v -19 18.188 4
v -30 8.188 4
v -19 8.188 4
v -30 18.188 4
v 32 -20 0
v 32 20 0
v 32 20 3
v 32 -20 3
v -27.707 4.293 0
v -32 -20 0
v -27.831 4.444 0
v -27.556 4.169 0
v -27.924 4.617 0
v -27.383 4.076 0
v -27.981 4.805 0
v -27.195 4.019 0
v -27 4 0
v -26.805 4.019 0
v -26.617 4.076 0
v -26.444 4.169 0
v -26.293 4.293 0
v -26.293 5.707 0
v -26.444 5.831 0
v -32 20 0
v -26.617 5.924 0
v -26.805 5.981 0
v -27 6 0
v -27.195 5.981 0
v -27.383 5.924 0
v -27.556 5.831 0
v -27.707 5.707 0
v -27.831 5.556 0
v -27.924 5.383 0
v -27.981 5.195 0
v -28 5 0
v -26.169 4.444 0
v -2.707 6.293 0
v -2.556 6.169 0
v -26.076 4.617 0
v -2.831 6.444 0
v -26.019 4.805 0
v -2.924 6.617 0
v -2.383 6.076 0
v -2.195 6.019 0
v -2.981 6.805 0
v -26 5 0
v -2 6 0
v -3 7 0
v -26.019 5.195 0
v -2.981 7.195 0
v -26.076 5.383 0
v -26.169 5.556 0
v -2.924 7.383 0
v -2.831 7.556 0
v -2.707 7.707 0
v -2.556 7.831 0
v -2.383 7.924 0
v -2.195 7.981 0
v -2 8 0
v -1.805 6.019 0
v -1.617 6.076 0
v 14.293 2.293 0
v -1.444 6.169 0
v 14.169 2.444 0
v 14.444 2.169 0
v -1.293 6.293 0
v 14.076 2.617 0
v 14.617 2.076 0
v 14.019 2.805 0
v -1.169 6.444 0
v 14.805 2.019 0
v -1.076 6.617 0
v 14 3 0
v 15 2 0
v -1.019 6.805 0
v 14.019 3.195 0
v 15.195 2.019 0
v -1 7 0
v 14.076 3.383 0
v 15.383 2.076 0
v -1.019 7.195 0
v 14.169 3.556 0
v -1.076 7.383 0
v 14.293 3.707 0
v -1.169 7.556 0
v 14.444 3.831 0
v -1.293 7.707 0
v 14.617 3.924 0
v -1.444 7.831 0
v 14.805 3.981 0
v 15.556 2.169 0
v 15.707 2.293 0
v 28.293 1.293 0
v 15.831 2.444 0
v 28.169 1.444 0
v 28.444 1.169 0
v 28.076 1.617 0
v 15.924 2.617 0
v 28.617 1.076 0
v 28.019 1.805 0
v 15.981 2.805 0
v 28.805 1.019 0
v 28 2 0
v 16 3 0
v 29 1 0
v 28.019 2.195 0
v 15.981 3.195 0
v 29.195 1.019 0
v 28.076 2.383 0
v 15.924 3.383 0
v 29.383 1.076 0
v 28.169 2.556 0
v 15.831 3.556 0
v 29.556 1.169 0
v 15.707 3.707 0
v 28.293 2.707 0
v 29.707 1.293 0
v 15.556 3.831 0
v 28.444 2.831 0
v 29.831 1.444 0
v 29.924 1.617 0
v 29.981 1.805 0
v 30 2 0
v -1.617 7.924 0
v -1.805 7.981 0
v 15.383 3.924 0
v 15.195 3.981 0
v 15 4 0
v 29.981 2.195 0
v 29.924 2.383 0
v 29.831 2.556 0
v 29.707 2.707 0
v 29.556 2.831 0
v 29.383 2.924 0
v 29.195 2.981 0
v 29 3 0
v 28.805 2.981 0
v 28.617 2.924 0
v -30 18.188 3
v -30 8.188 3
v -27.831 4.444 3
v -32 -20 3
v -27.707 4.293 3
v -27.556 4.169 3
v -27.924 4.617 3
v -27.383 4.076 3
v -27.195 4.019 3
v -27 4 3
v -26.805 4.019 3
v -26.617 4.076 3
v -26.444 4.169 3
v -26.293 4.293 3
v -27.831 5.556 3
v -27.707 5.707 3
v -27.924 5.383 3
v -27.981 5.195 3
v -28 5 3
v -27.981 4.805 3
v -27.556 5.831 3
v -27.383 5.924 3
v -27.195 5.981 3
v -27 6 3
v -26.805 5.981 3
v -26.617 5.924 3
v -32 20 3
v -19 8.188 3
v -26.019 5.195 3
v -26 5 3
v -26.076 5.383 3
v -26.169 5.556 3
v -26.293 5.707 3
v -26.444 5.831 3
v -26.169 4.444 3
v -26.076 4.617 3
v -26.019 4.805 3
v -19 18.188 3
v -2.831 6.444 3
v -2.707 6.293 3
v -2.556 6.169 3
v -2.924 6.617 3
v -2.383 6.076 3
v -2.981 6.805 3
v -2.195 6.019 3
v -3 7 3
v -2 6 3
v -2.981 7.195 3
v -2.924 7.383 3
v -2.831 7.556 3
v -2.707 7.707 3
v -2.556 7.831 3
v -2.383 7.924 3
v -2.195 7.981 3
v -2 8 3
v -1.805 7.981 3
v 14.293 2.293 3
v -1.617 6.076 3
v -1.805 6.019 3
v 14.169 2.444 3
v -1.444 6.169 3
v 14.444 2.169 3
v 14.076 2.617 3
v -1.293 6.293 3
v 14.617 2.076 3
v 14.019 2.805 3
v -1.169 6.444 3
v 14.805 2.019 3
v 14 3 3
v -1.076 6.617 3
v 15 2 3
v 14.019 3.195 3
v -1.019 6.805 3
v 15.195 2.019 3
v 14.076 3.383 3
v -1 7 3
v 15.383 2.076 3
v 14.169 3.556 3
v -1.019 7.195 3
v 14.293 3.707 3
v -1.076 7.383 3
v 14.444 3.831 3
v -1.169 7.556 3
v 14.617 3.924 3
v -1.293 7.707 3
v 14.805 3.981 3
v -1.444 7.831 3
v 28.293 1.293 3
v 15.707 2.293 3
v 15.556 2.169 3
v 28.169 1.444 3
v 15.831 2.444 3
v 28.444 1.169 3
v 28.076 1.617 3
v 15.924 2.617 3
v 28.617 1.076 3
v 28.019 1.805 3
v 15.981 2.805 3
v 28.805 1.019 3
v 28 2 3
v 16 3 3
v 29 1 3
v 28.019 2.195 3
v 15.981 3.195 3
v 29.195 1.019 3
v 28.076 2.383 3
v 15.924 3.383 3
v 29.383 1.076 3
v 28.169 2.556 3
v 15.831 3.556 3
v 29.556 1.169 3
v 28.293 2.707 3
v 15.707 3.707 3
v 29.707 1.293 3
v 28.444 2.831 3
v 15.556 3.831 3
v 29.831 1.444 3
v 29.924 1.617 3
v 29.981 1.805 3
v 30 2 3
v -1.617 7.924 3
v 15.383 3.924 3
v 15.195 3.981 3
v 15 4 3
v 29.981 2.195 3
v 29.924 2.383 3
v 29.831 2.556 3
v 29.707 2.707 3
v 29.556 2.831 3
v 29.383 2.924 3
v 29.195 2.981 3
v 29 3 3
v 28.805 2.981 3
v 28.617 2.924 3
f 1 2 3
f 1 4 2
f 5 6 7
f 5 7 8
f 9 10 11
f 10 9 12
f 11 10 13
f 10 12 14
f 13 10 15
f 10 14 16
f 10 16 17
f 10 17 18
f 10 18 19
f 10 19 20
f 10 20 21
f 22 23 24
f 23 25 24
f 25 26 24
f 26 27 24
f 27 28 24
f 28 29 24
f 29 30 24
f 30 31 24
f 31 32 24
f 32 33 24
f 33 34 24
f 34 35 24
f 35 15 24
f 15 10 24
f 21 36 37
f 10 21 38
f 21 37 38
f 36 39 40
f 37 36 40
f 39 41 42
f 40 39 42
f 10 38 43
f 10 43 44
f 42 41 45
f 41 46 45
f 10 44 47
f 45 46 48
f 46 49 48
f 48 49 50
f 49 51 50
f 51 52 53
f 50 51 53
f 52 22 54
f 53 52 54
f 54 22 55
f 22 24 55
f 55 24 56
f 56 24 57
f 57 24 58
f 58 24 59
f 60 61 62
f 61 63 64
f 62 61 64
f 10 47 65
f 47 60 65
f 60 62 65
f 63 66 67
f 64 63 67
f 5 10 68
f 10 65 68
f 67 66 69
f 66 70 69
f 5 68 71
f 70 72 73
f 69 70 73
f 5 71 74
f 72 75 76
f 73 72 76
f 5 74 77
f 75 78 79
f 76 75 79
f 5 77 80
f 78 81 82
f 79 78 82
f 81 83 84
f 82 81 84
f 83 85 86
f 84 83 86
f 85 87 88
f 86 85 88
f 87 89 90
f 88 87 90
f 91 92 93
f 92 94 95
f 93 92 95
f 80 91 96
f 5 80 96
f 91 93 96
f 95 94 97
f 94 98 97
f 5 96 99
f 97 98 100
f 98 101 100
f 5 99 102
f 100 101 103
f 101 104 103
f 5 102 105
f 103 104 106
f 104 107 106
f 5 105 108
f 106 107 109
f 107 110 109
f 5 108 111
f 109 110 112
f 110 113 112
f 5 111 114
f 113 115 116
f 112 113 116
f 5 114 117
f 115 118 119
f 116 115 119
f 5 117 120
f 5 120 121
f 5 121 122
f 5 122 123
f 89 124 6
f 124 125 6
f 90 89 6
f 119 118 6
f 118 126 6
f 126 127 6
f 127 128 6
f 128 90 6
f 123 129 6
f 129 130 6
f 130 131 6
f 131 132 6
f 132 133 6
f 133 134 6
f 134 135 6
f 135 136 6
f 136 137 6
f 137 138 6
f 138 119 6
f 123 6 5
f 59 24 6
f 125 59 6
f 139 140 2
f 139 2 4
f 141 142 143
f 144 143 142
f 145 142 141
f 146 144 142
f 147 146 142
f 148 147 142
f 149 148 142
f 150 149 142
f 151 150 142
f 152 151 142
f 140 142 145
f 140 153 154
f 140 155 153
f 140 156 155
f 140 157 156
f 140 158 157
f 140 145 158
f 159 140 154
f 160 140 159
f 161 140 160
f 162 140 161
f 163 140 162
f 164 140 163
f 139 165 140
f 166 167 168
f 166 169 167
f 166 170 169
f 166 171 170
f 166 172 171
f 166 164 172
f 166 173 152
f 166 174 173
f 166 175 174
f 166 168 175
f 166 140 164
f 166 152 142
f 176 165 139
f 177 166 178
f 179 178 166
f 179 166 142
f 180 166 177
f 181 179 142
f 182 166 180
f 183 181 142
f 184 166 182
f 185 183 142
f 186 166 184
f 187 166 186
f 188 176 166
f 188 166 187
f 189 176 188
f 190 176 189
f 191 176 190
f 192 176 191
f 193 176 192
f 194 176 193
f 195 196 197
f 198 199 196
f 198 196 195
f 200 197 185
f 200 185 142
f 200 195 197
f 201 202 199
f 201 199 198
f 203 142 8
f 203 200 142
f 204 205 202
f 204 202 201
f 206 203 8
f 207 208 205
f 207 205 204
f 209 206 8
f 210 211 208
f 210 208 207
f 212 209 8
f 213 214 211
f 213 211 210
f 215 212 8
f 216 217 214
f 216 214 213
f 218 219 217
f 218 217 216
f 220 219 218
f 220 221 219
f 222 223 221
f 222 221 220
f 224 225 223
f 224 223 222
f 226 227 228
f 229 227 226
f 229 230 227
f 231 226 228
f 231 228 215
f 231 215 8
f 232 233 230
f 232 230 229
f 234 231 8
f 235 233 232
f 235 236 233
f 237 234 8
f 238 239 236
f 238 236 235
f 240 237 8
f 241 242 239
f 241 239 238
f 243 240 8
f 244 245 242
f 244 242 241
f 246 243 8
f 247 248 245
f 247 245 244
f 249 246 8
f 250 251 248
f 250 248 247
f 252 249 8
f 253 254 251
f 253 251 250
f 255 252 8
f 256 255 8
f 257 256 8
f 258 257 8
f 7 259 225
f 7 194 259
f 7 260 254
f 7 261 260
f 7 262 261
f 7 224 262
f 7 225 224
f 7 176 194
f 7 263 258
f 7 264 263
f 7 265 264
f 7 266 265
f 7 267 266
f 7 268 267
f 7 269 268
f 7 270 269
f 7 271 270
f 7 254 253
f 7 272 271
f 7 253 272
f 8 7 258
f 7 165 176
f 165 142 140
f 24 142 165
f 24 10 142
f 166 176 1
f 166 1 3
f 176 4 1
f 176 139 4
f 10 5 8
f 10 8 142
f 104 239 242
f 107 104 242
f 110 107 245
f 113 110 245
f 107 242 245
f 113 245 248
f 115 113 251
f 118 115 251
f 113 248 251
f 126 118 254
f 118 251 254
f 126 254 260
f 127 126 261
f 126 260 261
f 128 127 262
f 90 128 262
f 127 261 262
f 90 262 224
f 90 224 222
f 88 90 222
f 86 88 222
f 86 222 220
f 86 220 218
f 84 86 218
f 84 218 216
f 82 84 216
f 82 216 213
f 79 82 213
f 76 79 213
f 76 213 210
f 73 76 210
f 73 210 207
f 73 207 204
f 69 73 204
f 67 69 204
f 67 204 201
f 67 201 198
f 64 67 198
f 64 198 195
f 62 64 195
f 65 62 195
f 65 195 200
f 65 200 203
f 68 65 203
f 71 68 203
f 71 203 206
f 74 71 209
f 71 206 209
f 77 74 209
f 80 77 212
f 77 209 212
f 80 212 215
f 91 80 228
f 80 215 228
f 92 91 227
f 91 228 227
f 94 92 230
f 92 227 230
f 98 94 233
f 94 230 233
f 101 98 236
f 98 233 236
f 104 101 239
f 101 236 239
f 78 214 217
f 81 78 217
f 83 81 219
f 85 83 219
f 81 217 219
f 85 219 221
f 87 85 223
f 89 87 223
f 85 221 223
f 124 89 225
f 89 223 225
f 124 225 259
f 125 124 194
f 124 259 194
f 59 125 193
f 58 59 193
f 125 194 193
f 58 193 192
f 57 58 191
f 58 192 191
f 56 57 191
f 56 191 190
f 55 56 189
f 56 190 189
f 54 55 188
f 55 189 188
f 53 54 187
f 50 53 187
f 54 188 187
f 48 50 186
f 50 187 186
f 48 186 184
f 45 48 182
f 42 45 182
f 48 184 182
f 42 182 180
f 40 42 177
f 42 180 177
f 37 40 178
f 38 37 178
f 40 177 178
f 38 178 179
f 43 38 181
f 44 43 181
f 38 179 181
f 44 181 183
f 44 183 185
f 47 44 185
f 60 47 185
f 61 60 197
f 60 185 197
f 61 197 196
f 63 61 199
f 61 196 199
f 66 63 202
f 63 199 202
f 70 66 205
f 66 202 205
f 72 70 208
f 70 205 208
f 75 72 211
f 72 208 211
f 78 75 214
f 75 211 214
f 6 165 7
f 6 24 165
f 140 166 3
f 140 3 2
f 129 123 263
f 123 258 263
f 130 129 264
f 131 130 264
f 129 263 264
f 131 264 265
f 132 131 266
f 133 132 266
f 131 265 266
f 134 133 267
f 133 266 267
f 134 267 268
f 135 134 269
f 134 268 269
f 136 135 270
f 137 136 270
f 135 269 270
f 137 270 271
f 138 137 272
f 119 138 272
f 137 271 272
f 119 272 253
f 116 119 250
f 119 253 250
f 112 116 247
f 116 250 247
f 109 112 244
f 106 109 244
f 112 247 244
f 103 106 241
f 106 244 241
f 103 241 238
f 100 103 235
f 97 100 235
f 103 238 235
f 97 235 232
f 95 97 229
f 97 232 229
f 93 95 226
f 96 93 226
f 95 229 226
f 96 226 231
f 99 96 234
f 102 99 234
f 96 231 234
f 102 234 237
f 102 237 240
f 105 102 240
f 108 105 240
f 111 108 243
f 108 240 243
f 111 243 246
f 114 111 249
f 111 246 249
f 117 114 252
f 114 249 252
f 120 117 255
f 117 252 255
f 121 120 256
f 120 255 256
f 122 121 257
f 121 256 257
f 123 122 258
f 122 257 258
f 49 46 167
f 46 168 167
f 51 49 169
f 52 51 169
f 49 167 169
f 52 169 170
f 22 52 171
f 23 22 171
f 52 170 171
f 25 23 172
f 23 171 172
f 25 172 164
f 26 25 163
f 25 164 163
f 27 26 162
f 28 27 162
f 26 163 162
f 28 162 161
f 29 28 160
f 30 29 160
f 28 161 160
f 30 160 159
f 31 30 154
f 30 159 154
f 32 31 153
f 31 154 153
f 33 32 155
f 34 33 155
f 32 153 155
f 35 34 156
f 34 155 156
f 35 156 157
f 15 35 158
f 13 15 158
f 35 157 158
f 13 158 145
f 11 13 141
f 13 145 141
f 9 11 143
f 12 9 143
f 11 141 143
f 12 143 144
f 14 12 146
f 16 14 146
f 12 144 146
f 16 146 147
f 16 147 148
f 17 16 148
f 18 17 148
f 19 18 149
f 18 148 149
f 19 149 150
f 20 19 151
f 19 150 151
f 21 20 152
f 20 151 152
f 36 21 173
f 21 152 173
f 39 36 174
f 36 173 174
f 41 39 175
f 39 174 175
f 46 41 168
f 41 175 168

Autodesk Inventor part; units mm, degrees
ref_plane "YZ Plane" through (0, 0, 0) normal (1, 0, 0) x (0, 1, 0)
ref_plane "XZ Plane" through (0, 0, 0) normal (0, 1, 0) x (-1, 0, 0)
ref_plane "XY Plane" through (0, 0, 0) normal (0, 0, 1) x (1, 0, 0)
sketch "草图1" plane through (0, 0, 0) normal (0, 0, 1) x (1, 0, 0)
  line L0 (32, -20) -> (-32, -20)
  line L1 (-32, -20) -> (-32, 20)
  line L2 (-32, 20) -> (32, 20)
  line L3 (32, 20) -> (32, -20)
  line L4 (32, -20) -> (-32, 20) construction
  line L5 (-32, -20) -> (32, 20) construction
  line L6 (-32, 10) -> (-30, 10)
  line L7 (-30, 10) -> (-30, -20)
  line L8 (-30, -20) -> (-32, -20)
  line L9 (-32, -20) -> (-32, 10)
  point P0 (0, 0)
  dimension "d0" = 64
  dimension "d1" = 40
  dimension "d2" = 2
  dimension "d3" = 30
extrude "拉伸1" add sketch "草图1" along normal blind 3
sketch "草图3" plane through (0, 0, 3) normal (0, 0, 1) x (1, 0, 0)
  circle A0 centre (-27, 5) radius 1
  line L0 (-32, 20) -> (-32, -20) projected
  line L1 (32, 20) -> (-32, 20) projected
  circle A1 centre (-2, 7) radius 1
  circle A2 centre (15, 3) radius 1
  circle A3 centre (29, 2) radius 1
  line L2 (32, -20) -> (32, 20) projected
  point P0 (0, 0)
  dimension "d10" = 2
  dimension "d11" = 5
  dimension "d12" = 15
  dimension "d13" = 2
  dimension "d14" = 25
  dimension "d16" = 2
  dimension "d17" = 2
  dimension "d19" = 4
  dimension "d20" = 17
  dimension "d21" = 2
  dimension "d22" = 1
  dimension "d23" = 3
  dimension "d24" = 14
extrude "拉伸2" cut sketch "草图3" against normal blind 10
sketch "草图4" plane through (0, 0, 3) normal (0, 0, 1) x (1, 0, 0)
  line L0 (-30, 18.1876) -> (-19, 18.1876)
  line L1 (-19, 18.1876) -> (-19, 8.1876)
  line L2 (-19, 8.1876) -> (-30, 8.1876)
  line L3 (-30, 8.1876) -> (-30, 18.1876)
  line L4 (-32, 20) -> (-32, -20) projected
  point P0 (0, 0)
  dimension "d27" = 2
  dimension "d28" = 10
  dimension "d29" = 11
extrude "拉伸3" add sketch "草图4" along normal blind 1
sketch "草图5" plane through (0, 0, 3) normal (0, 0, 1) x (1, 0, 0)
  point P0 (0, 0)
properties part number "摄像头电路部分"
